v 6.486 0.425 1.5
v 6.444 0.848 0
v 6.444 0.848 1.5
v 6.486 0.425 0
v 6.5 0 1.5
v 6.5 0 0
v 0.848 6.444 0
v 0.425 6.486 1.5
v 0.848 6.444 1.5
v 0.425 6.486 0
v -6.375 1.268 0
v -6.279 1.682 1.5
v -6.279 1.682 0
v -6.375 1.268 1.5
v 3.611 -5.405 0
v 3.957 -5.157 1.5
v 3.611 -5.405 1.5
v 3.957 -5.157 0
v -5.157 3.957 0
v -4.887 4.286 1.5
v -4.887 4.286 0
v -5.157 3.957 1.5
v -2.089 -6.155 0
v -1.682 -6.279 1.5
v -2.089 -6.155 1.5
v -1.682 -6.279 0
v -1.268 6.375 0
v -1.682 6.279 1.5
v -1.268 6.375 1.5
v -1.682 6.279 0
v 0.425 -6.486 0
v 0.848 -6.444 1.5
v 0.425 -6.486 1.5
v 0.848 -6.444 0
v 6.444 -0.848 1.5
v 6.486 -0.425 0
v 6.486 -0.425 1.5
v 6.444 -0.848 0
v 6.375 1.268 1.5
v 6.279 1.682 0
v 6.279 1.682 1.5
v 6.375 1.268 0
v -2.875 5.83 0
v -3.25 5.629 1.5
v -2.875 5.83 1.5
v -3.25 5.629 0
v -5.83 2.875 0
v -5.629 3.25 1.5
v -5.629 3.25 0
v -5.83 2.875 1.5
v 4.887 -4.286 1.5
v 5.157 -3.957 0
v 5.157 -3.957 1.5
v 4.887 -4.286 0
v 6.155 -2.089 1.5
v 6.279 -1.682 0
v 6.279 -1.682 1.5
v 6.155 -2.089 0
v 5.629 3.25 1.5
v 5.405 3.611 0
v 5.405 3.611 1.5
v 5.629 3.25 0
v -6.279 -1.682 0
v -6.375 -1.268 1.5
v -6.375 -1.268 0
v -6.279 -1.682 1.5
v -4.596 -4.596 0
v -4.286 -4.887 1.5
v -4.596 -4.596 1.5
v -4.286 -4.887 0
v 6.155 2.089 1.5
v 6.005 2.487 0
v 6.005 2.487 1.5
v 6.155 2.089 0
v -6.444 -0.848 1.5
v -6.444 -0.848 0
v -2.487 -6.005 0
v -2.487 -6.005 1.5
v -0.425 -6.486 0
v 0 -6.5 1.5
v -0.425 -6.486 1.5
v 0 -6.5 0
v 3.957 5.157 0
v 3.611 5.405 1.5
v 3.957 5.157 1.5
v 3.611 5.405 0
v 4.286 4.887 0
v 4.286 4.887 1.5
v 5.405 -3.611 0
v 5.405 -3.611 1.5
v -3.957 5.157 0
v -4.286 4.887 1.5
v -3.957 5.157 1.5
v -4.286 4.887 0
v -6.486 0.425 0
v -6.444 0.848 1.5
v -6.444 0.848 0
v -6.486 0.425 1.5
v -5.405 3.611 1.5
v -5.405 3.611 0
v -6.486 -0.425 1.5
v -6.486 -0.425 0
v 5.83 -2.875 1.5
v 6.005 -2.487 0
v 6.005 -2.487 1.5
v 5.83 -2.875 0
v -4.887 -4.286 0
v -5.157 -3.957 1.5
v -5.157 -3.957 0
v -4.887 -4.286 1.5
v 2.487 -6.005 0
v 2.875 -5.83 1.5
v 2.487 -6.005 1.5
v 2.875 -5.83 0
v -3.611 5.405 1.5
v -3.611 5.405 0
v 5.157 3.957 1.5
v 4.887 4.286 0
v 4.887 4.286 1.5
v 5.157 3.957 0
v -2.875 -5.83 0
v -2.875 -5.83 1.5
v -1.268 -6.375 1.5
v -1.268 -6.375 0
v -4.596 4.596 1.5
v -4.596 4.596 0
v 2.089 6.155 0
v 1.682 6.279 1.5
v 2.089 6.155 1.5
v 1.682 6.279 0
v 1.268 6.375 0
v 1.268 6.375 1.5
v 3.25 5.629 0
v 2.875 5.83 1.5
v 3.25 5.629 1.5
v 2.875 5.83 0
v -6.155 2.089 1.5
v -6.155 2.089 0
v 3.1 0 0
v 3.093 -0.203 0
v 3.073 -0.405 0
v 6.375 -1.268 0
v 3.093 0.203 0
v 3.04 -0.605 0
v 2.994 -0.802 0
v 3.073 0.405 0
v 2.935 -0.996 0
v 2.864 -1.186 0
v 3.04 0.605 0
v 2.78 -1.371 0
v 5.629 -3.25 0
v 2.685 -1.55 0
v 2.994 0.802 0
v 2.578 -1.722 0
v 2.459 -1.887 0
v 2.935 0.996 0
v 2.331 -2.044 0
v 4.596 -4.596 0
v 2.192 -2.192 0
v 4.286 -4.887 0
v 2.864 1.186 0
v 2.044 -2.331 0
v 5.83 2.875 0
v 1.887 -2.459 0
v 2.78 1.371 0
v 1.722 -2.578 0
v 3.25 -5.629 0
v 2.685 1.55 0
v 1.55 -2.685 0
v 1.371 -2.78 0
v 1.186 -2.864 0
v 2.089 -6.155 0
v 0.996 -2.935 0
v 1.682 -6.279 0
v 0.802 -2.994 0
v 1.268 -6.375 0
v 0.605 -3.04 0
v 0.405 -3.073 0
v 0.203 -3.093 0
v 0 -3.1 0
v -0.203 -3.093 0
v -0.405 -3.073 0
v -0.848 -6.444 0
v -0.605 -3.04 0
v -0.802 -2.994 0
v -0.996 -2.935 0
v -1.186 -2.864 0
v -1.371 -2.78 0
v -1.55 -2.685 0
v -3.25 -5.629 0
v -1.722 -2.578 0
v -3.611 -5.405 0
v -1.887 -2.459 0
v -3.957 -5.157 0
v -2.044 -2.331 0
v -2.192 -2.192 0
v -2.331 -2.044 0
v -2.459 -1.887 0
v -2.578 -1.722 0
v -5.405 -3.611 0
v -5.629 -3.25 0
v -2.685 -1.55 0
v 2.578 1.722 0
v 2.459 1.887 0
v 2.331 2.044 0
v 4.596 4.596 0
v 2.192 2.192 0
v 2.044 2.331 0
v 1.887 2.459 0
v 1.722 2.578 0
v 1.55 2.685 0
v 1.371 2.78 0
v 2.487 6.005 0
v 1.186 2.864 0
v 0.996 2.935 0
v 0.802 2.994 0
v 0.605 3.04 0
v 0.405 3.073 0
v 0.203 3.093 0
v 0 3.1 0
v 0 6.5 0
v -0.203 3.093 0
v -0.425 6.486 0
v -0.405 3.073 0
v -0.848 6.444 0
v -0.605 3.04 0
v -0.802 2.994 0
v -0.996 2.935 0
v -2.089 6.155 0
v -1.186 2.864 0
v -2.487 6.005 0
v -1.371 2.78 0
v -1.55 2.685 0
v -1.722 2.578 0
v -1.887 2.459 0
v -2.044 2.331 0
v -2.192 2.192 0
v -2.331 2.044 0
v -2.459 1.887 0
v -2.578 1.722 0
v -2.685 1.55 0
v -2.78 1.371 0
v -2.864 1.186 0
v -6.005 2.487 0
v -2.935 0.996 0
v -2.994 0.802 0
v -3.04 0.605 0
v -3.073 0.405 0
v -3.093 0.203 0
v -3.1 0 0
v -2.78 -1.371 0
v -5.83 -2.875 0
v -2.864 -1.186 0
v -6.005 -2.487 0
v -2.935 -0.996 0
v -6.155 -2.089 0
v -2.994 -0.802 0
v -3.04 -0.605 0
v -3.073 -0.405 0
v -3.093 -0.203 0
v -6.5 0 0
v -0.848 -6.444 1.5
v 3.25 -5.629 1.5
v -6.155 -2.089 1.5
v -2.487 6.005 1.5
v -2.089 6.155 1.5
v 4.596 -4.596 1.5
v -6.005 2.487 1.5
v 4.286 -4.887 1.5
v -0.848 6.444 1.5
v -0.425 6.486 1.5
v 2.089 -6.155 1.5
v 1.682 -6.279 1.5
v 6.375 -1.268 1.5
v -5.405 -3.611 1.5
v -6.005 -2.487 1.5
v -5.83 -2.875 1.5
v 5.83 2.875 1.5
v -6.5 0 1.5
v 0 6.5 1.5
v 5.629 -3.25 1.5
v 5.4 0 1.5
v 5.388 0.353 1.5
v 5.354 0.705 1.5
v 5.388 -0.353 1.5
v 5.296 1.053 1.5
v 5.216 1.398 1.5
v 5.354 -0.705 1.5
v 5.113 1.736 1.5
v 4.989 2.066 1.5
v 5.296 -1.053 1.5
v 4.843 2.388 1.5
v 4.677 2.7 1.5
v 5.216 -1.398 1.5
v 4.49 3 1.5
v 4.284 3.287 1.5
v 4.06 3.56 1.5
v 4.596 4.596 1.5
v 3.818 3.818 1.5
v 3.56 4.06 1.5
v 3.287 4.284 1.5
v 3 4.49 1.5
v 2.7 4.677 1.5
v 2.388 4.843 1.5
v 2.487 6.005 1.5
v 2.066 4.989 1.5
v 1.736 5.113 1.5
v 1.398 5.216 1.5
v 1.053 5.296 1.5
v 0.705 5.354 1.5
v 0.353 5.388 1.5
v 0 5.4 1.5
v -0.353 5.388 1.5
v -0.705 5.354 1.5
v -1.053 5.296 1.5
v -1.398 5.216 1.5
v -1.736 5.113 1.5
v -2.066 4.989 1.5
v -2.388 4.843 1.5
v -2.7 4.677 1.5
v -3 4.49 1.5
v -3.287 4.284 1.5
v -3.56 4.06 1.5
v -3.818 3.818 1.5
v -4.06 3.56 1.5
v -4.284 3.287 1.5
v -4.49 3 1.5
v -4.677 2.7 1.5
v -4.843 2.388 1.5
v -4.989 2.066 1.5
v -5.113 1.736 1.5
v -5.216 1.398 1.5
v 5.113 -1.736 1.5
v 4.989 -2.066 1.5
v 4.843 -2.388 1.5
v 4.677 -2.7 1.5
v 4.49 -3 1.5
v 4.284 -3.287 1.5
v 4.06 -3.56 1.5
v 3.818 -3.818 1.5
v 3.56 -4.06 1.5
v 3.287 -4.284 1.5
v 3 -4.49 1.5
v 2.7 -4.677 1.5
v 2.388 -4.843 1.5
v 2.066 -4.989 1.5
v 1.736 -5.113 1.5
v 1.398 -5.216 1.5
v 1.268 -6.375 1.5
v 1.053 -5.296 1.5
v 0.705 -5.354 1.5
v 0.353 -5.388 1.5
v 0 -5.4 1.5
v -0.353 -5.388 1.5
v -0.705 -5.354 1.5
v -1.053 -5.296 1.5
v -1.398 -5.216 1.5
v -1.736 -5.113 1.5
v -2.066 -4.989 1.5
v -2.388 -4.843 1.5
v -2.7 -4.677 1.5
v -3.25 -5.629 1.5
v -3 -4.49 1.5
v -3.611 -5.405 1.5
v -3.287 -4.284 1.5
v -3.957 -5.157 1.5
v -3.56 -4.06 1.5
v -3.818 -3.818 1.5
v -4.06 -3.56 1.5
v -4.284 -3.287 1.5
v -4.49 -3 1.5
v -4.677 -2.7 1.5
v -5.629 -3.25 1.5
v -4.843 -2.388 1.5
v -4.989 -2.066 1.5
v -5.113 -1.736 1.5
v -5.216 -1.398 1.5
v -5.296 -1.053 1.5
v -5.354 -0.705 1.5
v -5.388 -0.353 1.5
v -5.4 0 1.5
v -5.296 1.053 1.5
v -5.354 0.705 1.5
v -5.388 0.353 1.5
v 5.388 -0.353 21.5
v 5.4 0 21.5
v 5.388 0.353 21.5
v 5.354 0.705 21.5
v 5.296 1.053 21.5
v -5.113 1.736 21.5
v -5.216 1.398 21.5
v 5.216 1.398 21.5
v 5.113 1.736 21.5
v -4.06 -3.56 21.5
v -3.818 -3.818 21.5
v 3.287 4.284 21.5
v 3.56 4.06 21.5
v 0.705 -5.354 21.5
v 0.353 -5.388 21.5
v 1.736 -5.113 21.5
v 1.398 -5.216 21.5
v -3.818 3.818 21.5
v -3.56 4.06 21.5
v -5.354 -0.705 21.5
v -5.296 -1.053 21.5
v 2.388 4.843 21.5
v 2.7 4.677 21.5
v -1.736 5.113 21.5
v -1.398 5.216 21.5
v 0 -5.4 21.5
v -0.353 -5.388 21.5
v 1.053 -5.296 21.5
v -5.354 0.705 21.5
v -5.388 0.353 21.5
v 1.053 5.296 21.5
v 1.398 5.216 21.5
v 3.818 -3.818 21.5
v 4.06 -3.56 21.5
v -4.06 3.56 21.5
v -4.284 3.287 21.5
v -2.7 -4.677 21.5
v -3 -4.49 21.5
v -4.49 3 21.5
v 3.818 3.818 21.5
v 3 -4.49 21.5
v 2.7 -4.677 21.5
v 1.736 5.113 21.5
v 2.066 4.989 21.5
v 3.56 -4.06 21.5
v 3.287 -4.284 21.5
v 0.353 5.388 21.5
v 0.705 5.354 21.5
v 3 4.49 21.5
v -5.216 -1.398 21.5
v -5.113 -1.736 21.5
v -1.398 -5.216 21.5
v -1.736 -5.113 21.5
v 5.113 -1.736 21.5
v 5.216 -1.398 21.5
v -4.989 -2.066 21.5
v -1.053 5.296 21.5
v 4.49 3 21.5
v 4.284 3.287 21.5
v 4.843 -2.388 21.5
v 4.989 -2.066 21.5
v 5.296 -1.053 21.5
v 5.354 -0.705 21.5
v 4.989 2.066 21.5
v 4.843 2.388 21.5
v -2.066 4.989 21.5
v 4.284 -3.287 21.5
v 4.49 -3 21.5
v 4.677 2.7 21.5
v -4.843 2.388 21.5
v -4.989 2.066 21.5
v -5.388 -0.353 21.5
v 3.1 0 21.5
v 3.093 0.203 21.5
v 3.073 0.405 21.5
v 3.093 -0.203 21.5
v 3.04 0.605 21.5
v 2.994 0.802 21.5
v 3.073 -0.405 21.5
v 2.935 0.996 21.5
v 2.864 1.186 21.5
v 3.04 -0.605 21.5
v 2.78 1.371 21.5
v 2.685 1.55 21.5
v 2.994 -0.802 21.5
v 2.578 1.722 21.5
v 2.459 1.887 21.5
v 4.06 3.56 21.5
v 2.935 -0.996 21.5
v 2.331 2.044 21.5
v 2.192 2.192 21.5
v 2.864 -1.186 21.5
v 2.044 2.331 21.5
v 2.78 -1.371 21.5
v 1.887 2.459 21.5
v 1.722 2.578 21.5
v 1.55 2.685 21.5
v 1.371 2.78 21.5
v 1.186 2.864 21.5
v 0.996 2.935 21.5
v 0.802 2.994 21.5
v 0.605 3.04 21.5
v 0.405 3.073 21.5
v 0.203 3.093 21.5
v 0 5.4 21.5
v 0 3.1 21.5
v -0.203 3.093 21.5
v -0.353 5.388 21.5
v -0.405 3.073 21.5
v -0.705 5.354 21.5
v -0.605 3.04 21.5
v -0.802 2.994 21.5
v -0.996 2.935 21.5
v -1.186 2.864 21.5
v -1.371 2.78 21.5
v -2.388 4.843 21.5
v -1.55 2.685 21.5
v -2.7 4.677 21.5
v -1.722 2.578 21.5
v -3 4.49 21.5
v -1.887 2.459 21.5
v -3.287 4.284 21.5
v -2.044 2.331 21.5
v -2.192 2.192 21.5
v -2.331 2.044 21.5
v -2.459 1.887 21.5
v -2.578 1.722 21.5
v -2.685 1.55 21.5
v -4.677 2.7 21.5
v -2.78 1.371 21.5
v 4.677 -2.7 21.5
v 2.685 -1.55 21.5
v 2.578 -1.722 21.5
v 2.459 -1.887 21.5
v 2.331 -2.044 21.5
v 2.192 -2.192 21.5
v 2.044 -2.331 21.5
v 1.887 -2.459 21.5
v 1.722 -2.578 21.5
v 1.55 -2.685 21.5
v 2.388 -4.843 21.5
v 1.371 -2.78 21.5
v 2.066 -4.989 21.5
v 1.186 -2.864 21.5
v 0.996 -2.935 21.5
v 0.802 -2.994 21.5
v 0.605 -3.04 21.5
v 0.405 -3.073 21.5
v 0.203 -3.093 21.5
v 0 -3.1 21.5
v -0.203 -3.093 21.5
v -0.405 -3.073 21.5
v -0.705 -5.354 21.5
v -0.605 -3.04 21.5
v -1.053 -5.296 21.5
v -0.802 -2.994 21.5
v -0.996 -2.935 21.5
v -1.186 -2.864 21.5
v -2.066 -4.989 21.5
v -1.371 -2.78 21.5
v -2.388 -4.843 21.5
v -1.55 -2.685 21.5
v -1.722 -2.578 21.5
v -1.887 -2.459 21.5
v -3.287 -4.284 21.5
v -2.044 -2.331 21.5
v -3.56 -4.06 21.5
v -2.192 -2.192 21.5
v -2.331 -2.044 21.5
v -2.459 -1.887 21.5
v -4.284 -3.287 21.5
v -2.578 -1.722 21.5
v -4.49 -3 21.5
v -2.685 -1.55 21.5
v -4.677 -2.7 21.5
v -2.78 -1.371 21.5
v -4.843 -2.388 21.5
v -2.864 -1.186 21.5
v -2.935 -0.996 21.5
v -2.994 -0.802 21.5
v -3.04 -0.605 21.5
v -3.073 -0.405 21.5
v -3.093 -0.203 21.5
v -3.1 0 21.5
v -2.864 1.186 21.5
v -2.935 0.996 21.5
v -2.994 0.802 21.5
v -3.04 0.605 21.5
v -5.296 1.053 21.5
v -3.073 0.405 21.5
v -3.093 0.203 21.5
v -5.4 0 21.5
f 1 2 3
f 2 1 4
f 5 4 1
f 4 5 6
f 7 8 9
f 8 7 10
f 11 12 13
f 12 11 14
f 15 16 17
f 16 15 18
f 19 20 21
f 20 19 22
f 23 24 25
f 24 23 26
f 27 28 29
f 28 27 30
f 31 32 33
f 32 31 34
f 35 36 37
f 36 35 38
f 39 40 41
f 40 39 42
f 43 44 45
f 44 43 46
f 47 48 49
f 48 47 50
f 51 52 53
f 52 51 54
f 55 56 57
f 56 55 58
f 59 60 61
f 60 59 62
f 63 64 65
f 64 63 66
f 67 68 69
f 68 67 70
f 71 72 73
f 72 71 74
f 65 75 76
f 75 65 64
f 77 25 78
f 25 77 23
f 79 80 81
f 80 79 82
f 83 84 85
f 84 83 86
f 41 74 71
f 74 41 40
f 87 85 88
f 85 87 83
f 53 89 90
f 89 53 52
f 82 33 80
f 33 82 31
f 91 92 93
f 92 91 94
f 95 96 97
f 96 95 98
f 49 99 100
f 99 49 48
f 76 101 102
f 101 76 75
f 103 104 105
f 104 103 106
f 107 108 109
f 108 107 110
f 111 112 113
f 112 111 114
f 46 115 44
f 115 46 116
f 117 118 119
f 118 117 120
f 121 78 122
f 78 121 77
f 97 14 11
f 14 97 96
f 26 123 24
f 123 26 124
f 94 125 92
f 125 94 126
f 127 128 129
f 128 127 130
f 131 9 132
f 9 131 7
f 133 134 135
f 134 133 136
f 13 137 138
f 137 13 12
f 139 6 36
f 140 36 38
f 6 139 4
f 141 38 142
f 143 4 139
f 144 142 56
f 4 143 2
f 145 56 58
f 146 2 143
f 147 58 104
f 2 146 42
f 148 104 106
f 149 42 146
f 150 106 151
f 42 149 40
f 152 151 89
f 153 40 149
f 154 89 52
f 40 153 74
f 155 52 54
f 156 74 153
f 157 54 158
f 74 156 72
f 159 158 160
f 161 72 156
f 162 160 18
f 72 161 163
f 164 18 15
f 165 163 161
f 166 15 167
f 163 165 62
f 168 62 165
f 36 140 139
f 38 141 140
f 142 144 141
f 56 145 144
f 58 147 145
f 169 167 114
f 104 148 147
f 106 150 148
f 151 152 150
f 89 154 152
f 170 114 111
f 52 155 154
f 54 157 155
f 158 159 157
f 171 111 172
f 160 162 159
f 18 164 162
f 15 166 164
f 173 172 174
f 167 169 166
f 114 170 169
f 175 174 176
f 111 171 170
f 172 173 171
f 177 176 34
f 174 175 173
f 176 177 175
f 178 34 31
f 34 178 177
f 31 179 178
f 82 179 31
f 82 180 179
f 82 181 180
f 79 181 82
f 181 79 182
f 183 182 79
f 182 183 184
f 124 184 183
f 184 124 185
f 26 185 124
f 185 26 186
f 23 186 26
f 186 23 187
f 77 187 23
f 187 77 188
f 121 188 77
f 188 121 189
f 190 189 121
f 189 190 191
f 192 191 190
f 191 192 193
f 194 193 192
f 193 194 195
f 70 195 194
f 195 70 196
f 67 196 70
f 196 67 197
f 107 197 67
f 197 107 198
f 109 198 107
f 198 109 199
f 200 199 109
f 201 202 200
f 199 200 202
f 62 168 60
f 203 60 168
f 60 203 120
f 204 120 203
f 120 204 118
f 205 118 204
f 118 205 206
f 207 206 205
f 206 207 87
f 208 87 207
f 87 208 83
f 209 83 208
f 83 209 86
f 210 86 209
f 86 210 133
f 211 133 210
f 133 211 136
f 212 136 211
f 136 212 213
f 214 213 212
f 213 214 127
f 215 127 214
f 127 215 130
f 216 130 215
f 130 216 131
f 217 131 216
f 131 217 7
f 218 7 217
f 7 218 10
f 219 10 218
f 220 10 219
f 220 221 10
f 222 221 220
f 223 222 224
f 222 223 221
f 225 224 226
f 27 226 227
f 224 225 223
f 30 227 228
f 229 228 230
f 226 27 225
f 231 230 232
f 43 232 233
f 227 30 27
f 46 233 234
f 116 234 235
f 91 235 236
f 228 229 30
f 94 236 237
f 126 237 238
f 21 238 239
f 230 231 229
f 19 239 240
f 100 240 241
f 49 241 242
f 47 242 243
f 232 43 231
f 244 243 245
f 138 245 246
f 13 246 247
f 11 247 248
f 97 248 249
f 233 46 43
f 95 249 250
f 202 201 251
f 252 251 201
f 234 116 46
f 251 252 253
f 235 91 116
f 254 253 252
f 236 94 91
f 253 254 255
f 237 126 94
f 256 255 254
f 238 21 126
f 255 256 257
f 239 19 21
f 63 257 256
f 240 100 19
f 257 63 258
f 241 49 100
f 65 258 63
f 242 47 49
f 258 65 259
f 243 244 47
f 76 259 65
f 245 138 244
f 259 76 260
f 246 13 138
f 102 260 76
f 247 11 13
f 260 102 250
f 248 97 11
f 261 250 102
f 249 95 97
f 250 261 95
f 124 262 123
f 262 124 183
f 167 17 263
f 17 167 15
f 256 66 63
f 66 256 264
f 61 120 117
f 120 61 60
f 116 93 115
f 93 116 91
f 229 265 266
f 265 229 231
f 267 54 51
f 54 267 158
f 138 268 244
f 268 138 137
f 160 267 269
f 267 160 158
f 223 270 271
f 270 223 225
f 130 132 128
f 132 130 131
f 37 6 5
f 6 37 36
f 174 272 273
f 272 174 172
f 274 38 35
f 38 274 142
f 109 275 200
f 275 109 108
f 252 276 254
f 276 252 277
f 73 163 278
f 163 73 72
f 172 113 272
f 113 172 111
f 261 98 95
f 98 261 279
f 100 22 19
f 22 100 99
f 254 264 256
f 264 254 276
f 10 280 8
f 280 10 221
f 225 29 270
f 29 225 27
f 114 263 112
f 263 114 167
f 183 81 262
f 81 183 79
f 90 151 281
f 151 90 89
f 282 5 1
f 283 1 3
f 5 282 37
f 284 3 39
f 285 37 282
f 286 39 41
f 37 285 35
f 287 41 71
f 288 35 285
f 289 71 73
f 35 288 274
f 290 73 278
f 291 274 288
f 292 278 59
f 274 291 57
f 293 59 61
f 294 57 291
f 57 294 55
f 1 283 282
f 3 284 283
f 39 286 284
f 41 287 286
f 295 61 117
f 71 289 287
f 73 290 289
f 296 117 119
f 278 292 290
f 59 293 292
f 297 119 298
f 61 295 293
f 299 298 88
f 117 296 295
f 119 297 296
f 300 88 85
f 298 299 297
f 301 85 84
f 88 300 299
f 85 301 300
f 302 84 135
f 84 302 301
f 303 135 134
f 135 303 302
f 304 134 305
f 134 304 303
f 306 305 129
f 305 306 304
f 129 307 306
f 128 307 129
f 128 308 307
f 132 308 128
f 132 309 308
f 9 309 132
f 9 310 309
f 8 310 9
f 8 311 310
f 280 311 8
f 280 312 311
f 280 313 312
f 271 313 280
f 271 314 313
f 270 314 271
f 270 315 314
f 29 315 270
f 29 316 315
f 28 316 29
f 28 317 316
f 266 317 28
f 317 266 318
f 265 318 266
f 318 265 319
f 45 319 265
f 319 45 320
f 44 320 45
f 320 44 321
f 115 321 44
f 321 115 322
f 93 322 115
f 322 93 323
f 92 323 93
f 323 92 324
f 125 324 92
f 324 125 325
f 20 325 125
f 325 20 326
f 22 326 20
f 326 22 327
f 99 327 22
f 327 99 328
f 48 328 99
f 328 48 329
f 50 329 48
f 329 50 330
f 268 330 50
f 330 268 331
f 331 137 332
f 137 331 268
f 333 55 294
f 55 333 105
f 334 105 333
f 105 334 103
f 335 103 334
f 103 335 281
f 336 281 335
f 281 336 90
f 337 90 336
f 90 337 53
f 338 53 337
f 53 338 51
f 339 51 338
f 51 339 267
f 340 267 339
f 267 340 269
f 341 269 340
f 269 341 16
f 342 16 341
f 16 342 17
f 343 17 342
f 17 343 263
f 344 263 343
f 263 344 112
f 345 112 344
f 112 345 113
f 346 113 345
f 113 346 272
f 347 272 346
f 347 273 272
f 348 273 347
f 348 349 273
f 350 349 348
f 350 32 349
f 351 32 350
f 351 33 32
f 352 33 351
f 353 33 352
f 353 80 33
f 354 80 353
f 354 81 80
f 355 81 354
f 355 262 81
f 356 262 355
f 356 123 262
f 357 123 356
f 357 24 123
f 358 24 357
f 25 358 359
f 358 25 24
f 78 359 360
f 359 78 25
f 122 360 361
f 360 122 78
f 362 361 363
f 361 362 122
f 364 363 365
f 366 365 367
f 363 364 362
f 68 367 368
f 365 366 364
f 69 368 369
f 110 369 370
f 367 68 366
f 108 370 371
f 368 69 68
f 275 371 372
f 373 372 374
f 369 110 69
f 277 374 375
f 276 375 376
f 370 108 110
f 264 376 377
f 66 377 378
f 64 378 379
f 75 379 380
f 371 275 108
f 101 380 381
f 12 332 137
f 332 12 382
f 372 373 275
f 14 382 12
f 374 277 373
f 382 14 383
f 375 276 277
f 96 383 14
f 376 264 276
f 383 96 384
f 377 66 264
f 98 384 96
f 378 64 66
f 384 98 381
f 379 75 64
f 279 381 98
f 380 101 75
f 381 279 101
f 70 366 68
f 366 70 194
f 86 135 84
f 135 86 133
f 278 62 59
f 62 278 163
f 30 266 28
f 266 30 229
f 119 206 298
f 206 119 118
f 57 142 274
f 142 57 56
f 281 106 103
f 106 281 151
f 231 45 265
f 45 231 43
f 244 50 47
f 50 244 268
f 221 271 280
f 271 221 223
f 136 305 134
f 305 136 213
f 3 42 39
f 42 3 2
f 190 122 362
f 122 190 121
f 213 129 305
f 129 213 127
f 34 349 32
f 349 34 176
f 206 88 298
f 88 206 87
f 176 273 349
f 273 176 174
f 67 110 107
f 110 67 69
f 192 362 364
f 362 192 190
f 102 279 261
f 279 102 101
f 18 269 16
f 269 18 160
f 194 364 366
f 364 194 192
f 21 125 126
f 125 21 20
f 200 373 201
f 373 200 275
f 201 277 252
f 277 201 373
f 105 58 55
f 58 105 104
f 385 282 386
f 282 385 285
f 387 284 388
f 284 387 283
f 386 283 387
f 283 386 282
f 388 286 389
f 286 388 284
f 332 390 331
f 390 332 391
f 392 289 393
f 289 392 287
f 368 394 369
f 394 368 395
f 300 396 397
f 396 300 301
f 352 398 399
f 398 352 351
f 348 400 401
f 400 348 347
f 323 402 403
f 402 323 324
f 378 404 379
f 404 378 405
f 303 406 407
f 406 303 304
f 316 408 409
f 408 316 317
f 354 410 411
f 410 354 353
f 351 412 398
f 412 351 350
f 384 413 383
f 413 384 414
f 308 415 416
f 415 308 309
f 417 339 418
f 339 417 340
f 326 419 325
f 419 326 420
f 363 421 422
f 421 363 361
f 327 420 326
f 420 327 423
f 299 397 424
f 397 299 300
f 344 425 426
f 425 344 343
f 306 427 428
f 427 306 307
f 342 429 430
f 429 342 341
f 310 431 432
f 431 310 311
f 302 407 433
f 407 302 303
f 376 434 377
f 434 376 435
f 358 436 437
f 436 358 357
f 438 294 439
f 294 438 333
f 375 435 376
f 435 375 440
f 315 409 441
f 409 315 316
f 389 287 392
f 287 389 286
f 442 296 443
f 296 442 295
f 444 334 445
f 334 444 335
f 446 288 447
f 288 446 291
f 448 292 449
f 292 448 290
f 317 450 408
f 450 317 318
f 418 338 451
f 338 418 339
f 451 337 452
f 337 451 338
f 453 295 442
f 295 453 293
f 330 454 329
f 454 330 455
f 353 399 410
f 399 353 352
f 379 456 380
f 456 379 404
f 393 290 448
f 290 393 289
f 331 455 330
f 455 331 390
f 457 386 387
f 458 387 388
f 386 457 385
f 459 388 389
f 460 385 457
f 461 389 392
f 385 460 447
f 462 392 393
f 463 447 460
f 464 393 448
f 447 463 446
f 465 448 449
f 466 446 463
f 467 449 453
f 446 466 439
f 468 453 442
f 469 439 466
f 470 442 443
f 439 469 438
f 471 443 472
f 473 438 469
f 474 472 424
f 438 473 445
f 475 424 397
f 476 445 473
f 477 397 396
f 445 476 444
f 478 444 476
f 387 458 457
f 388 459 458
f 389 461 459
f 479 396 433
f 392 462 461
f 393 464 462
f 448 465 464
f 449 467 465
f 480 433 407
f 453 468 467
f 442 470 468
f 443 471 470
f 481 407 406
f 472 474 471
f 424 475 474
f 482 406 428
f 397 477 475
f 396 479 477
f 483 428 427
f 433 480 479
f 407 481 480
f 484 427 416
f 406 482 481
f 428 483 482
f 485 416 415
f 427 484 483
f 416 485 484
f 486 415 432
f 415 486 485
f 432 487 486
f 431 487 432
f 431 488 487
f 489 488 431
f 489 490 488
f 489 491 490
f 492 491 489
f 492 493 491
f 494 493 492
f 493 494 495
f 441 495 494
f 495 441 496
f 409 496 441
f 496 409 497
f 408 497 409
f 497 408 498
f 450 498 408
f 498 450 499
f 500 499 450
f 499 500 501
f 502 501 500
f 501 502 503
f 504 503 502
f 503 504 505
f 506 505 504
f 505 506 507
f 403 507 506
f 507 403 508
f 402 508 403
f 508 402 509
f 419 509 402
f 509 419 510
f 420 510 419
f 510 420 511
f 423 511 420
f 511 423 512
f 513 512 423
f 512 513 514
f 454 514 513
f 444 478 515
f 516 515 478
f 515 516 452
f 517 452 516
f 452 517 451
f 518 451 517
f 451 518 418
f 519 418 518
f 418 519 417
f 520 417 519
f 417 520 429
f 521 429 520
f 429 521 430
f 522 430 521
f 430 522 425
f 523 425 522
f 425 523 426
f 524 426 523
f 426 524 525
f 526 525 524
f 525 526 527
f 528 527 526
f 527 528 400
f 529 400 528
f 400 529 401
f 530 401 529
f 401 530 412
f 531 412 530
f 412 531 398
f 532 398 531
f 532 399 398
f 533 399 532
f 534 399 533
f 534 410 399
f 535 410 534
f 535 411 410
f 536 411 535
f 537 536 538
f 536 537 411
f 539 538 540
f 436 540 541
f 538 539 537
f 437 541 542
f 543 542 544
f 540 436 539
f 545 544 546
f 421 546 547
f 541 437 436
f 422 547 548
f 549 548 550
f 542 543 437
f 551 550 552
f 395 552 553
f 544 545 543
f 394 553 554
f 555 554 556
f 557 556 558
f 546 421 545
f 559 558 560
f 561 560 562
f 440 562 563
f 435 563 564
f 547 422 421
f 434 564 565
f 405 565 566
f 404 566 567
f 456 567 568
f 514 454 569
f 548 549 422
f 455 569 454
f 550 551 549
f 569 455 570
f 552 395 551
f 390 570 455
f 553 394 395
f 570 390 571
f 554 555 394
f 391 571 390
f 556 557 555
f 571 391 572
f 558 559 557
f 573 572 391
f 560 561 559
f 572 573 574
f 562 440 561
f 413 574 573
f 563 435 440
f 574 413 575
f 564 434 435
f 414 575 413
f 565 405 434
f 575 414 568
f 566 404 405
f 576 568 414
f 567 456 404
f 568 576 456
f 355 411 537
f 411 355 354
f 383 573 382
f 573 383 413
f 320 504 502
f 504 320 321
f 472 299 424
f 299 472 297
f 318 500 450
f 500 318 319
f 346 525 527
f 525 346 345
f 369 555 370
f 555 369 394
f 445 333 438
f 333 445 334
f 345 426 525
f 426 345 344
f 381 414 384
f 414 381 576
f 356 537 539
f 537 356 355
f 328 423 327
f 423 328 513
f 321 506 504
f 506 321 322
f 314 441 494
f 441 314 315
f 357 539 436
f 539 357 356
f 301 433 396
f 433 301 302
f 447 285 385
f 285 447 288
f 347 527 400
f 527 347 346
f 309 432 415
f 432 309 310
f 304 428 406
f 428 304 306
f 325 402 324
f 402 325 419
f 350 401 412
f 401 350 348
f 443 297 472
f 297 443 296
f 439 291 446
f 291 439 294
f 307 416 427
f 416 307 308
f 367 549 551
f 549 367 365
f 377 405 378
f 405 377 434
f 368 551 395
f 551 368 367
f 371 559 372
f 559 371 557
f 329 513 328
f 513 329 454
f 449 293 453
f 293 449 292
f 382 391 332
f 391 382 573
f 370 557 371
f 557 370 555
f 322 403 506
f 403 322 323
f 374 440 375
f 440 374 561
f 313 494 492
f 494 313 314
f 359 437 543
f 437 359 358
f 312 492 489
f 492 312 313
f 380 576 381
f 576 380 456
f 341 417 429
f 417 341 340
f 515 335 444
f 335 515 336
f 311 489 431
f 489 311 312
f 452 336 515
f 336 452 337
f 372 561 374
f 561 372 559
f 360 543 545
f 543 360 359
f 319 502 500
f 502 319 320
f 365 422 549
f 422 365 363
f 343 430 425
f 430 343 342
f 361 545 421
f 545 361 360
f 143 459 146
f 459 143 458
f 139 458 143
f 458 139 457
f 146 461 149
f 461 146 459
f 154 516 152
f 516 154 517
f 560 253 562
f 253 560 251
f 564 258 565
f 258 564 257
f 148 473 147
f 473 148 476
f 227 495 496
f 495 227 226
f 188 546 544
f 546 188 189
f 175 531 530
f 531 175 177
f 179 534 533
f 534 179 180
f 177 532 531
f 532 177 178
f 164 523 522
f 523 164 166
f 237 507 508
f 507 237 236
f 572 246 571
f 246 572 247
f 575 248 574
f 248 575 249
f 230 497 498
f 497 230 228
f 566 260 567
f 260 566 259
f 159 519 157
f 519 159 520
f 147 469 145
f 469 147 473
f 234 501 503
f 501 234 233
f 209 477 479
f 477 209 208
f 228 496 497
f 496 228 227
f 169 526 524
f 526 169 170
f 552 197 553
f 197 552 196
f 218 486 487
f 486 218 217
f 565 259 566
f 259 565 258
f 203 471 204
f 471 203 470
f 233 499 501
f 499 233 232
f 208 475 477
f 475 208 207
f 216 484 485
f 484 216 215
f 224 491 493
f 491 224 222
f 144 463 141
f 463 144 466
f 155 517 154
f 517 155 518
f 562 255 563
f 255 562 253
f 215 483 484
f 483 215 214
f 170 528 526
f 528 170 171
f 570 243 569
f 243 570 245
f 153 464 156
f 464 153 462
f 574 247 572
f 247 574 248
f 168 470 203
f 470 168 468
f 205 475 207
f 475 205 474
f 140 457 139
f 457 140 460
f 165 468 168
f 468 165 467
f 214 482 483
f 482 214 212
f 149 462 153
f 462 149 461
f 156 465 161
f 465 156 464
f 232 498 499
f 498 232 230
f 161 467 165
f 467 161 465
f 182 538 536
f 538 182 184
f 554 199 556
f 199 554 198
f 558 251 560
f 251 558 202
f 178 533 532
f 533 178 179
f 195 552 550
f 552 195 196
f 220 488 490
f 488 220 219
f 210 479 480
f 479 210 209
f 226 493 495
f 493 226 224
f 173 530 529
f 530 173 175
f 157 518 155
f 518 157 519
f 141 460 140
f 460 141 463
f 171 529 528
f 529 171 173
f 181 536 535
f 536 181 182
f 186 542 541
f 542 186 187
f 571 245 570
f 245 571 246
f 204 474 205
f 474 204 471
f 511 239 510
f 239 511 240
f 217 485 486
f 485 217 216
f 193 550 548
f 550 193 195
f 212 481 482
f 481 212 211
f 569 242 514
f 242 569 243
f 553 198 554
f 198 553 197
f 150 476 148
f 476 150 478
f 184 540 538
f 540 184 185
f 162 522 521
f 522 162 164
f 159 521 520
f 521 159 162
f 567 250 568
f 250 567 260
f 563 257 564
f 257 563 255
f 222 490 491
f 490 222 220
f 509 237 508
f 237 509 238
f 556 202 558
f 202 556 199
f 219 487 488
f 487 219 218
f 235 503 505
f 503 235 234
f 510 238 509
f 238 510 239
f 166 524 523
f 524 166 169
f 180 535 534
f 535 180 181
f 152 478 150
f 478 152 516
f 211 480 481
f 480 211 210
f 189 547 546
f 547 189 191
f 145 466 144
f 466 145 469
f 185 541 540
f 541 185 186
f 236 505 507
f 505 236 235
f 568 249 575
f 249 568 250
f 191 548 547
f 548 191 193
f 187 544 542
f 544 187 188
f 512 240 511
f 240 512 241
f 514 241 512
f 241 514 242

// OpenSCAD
// Adapter sleeve: lets a 0.2 mL PCR tube sit in a rack hole made for 1.5 mL tubes
// Printed upside down: collar on the bed, sleeve body rising upward.

$fn = 96;

// --- Dimensions (mm) ---
collar_d      = 13;    // collar outer diameter
collar_h      = 1.5;   // collar thickness (z = 0 to 1.5)
body_d        = 10.8;  // sleeve body outer diameter
total_h       = 21.5;  // overall height (top of sleeve body)
bore_d        = 6.2;   // straight through-bore diameter
eps           = 0.5;   // cutter overshoot past faces

difference() {
    union() {
        // Collar lying on the bed
        cylinder(d = collar_d, h = collar_h);
        // Sleeve body rising from the collar (overlaps collar slightly for a clean union)
        translate([0, 0, collar_h - 0.01])
            cylinder(d = body_d, h = total_h - collar_h + 0.01);
    }
    // Straight bore through the full height, open at both ends
    translate([0, 0, -eps])
        cylinder(d = bore_d, h = total_h + 2 * eps);
}
